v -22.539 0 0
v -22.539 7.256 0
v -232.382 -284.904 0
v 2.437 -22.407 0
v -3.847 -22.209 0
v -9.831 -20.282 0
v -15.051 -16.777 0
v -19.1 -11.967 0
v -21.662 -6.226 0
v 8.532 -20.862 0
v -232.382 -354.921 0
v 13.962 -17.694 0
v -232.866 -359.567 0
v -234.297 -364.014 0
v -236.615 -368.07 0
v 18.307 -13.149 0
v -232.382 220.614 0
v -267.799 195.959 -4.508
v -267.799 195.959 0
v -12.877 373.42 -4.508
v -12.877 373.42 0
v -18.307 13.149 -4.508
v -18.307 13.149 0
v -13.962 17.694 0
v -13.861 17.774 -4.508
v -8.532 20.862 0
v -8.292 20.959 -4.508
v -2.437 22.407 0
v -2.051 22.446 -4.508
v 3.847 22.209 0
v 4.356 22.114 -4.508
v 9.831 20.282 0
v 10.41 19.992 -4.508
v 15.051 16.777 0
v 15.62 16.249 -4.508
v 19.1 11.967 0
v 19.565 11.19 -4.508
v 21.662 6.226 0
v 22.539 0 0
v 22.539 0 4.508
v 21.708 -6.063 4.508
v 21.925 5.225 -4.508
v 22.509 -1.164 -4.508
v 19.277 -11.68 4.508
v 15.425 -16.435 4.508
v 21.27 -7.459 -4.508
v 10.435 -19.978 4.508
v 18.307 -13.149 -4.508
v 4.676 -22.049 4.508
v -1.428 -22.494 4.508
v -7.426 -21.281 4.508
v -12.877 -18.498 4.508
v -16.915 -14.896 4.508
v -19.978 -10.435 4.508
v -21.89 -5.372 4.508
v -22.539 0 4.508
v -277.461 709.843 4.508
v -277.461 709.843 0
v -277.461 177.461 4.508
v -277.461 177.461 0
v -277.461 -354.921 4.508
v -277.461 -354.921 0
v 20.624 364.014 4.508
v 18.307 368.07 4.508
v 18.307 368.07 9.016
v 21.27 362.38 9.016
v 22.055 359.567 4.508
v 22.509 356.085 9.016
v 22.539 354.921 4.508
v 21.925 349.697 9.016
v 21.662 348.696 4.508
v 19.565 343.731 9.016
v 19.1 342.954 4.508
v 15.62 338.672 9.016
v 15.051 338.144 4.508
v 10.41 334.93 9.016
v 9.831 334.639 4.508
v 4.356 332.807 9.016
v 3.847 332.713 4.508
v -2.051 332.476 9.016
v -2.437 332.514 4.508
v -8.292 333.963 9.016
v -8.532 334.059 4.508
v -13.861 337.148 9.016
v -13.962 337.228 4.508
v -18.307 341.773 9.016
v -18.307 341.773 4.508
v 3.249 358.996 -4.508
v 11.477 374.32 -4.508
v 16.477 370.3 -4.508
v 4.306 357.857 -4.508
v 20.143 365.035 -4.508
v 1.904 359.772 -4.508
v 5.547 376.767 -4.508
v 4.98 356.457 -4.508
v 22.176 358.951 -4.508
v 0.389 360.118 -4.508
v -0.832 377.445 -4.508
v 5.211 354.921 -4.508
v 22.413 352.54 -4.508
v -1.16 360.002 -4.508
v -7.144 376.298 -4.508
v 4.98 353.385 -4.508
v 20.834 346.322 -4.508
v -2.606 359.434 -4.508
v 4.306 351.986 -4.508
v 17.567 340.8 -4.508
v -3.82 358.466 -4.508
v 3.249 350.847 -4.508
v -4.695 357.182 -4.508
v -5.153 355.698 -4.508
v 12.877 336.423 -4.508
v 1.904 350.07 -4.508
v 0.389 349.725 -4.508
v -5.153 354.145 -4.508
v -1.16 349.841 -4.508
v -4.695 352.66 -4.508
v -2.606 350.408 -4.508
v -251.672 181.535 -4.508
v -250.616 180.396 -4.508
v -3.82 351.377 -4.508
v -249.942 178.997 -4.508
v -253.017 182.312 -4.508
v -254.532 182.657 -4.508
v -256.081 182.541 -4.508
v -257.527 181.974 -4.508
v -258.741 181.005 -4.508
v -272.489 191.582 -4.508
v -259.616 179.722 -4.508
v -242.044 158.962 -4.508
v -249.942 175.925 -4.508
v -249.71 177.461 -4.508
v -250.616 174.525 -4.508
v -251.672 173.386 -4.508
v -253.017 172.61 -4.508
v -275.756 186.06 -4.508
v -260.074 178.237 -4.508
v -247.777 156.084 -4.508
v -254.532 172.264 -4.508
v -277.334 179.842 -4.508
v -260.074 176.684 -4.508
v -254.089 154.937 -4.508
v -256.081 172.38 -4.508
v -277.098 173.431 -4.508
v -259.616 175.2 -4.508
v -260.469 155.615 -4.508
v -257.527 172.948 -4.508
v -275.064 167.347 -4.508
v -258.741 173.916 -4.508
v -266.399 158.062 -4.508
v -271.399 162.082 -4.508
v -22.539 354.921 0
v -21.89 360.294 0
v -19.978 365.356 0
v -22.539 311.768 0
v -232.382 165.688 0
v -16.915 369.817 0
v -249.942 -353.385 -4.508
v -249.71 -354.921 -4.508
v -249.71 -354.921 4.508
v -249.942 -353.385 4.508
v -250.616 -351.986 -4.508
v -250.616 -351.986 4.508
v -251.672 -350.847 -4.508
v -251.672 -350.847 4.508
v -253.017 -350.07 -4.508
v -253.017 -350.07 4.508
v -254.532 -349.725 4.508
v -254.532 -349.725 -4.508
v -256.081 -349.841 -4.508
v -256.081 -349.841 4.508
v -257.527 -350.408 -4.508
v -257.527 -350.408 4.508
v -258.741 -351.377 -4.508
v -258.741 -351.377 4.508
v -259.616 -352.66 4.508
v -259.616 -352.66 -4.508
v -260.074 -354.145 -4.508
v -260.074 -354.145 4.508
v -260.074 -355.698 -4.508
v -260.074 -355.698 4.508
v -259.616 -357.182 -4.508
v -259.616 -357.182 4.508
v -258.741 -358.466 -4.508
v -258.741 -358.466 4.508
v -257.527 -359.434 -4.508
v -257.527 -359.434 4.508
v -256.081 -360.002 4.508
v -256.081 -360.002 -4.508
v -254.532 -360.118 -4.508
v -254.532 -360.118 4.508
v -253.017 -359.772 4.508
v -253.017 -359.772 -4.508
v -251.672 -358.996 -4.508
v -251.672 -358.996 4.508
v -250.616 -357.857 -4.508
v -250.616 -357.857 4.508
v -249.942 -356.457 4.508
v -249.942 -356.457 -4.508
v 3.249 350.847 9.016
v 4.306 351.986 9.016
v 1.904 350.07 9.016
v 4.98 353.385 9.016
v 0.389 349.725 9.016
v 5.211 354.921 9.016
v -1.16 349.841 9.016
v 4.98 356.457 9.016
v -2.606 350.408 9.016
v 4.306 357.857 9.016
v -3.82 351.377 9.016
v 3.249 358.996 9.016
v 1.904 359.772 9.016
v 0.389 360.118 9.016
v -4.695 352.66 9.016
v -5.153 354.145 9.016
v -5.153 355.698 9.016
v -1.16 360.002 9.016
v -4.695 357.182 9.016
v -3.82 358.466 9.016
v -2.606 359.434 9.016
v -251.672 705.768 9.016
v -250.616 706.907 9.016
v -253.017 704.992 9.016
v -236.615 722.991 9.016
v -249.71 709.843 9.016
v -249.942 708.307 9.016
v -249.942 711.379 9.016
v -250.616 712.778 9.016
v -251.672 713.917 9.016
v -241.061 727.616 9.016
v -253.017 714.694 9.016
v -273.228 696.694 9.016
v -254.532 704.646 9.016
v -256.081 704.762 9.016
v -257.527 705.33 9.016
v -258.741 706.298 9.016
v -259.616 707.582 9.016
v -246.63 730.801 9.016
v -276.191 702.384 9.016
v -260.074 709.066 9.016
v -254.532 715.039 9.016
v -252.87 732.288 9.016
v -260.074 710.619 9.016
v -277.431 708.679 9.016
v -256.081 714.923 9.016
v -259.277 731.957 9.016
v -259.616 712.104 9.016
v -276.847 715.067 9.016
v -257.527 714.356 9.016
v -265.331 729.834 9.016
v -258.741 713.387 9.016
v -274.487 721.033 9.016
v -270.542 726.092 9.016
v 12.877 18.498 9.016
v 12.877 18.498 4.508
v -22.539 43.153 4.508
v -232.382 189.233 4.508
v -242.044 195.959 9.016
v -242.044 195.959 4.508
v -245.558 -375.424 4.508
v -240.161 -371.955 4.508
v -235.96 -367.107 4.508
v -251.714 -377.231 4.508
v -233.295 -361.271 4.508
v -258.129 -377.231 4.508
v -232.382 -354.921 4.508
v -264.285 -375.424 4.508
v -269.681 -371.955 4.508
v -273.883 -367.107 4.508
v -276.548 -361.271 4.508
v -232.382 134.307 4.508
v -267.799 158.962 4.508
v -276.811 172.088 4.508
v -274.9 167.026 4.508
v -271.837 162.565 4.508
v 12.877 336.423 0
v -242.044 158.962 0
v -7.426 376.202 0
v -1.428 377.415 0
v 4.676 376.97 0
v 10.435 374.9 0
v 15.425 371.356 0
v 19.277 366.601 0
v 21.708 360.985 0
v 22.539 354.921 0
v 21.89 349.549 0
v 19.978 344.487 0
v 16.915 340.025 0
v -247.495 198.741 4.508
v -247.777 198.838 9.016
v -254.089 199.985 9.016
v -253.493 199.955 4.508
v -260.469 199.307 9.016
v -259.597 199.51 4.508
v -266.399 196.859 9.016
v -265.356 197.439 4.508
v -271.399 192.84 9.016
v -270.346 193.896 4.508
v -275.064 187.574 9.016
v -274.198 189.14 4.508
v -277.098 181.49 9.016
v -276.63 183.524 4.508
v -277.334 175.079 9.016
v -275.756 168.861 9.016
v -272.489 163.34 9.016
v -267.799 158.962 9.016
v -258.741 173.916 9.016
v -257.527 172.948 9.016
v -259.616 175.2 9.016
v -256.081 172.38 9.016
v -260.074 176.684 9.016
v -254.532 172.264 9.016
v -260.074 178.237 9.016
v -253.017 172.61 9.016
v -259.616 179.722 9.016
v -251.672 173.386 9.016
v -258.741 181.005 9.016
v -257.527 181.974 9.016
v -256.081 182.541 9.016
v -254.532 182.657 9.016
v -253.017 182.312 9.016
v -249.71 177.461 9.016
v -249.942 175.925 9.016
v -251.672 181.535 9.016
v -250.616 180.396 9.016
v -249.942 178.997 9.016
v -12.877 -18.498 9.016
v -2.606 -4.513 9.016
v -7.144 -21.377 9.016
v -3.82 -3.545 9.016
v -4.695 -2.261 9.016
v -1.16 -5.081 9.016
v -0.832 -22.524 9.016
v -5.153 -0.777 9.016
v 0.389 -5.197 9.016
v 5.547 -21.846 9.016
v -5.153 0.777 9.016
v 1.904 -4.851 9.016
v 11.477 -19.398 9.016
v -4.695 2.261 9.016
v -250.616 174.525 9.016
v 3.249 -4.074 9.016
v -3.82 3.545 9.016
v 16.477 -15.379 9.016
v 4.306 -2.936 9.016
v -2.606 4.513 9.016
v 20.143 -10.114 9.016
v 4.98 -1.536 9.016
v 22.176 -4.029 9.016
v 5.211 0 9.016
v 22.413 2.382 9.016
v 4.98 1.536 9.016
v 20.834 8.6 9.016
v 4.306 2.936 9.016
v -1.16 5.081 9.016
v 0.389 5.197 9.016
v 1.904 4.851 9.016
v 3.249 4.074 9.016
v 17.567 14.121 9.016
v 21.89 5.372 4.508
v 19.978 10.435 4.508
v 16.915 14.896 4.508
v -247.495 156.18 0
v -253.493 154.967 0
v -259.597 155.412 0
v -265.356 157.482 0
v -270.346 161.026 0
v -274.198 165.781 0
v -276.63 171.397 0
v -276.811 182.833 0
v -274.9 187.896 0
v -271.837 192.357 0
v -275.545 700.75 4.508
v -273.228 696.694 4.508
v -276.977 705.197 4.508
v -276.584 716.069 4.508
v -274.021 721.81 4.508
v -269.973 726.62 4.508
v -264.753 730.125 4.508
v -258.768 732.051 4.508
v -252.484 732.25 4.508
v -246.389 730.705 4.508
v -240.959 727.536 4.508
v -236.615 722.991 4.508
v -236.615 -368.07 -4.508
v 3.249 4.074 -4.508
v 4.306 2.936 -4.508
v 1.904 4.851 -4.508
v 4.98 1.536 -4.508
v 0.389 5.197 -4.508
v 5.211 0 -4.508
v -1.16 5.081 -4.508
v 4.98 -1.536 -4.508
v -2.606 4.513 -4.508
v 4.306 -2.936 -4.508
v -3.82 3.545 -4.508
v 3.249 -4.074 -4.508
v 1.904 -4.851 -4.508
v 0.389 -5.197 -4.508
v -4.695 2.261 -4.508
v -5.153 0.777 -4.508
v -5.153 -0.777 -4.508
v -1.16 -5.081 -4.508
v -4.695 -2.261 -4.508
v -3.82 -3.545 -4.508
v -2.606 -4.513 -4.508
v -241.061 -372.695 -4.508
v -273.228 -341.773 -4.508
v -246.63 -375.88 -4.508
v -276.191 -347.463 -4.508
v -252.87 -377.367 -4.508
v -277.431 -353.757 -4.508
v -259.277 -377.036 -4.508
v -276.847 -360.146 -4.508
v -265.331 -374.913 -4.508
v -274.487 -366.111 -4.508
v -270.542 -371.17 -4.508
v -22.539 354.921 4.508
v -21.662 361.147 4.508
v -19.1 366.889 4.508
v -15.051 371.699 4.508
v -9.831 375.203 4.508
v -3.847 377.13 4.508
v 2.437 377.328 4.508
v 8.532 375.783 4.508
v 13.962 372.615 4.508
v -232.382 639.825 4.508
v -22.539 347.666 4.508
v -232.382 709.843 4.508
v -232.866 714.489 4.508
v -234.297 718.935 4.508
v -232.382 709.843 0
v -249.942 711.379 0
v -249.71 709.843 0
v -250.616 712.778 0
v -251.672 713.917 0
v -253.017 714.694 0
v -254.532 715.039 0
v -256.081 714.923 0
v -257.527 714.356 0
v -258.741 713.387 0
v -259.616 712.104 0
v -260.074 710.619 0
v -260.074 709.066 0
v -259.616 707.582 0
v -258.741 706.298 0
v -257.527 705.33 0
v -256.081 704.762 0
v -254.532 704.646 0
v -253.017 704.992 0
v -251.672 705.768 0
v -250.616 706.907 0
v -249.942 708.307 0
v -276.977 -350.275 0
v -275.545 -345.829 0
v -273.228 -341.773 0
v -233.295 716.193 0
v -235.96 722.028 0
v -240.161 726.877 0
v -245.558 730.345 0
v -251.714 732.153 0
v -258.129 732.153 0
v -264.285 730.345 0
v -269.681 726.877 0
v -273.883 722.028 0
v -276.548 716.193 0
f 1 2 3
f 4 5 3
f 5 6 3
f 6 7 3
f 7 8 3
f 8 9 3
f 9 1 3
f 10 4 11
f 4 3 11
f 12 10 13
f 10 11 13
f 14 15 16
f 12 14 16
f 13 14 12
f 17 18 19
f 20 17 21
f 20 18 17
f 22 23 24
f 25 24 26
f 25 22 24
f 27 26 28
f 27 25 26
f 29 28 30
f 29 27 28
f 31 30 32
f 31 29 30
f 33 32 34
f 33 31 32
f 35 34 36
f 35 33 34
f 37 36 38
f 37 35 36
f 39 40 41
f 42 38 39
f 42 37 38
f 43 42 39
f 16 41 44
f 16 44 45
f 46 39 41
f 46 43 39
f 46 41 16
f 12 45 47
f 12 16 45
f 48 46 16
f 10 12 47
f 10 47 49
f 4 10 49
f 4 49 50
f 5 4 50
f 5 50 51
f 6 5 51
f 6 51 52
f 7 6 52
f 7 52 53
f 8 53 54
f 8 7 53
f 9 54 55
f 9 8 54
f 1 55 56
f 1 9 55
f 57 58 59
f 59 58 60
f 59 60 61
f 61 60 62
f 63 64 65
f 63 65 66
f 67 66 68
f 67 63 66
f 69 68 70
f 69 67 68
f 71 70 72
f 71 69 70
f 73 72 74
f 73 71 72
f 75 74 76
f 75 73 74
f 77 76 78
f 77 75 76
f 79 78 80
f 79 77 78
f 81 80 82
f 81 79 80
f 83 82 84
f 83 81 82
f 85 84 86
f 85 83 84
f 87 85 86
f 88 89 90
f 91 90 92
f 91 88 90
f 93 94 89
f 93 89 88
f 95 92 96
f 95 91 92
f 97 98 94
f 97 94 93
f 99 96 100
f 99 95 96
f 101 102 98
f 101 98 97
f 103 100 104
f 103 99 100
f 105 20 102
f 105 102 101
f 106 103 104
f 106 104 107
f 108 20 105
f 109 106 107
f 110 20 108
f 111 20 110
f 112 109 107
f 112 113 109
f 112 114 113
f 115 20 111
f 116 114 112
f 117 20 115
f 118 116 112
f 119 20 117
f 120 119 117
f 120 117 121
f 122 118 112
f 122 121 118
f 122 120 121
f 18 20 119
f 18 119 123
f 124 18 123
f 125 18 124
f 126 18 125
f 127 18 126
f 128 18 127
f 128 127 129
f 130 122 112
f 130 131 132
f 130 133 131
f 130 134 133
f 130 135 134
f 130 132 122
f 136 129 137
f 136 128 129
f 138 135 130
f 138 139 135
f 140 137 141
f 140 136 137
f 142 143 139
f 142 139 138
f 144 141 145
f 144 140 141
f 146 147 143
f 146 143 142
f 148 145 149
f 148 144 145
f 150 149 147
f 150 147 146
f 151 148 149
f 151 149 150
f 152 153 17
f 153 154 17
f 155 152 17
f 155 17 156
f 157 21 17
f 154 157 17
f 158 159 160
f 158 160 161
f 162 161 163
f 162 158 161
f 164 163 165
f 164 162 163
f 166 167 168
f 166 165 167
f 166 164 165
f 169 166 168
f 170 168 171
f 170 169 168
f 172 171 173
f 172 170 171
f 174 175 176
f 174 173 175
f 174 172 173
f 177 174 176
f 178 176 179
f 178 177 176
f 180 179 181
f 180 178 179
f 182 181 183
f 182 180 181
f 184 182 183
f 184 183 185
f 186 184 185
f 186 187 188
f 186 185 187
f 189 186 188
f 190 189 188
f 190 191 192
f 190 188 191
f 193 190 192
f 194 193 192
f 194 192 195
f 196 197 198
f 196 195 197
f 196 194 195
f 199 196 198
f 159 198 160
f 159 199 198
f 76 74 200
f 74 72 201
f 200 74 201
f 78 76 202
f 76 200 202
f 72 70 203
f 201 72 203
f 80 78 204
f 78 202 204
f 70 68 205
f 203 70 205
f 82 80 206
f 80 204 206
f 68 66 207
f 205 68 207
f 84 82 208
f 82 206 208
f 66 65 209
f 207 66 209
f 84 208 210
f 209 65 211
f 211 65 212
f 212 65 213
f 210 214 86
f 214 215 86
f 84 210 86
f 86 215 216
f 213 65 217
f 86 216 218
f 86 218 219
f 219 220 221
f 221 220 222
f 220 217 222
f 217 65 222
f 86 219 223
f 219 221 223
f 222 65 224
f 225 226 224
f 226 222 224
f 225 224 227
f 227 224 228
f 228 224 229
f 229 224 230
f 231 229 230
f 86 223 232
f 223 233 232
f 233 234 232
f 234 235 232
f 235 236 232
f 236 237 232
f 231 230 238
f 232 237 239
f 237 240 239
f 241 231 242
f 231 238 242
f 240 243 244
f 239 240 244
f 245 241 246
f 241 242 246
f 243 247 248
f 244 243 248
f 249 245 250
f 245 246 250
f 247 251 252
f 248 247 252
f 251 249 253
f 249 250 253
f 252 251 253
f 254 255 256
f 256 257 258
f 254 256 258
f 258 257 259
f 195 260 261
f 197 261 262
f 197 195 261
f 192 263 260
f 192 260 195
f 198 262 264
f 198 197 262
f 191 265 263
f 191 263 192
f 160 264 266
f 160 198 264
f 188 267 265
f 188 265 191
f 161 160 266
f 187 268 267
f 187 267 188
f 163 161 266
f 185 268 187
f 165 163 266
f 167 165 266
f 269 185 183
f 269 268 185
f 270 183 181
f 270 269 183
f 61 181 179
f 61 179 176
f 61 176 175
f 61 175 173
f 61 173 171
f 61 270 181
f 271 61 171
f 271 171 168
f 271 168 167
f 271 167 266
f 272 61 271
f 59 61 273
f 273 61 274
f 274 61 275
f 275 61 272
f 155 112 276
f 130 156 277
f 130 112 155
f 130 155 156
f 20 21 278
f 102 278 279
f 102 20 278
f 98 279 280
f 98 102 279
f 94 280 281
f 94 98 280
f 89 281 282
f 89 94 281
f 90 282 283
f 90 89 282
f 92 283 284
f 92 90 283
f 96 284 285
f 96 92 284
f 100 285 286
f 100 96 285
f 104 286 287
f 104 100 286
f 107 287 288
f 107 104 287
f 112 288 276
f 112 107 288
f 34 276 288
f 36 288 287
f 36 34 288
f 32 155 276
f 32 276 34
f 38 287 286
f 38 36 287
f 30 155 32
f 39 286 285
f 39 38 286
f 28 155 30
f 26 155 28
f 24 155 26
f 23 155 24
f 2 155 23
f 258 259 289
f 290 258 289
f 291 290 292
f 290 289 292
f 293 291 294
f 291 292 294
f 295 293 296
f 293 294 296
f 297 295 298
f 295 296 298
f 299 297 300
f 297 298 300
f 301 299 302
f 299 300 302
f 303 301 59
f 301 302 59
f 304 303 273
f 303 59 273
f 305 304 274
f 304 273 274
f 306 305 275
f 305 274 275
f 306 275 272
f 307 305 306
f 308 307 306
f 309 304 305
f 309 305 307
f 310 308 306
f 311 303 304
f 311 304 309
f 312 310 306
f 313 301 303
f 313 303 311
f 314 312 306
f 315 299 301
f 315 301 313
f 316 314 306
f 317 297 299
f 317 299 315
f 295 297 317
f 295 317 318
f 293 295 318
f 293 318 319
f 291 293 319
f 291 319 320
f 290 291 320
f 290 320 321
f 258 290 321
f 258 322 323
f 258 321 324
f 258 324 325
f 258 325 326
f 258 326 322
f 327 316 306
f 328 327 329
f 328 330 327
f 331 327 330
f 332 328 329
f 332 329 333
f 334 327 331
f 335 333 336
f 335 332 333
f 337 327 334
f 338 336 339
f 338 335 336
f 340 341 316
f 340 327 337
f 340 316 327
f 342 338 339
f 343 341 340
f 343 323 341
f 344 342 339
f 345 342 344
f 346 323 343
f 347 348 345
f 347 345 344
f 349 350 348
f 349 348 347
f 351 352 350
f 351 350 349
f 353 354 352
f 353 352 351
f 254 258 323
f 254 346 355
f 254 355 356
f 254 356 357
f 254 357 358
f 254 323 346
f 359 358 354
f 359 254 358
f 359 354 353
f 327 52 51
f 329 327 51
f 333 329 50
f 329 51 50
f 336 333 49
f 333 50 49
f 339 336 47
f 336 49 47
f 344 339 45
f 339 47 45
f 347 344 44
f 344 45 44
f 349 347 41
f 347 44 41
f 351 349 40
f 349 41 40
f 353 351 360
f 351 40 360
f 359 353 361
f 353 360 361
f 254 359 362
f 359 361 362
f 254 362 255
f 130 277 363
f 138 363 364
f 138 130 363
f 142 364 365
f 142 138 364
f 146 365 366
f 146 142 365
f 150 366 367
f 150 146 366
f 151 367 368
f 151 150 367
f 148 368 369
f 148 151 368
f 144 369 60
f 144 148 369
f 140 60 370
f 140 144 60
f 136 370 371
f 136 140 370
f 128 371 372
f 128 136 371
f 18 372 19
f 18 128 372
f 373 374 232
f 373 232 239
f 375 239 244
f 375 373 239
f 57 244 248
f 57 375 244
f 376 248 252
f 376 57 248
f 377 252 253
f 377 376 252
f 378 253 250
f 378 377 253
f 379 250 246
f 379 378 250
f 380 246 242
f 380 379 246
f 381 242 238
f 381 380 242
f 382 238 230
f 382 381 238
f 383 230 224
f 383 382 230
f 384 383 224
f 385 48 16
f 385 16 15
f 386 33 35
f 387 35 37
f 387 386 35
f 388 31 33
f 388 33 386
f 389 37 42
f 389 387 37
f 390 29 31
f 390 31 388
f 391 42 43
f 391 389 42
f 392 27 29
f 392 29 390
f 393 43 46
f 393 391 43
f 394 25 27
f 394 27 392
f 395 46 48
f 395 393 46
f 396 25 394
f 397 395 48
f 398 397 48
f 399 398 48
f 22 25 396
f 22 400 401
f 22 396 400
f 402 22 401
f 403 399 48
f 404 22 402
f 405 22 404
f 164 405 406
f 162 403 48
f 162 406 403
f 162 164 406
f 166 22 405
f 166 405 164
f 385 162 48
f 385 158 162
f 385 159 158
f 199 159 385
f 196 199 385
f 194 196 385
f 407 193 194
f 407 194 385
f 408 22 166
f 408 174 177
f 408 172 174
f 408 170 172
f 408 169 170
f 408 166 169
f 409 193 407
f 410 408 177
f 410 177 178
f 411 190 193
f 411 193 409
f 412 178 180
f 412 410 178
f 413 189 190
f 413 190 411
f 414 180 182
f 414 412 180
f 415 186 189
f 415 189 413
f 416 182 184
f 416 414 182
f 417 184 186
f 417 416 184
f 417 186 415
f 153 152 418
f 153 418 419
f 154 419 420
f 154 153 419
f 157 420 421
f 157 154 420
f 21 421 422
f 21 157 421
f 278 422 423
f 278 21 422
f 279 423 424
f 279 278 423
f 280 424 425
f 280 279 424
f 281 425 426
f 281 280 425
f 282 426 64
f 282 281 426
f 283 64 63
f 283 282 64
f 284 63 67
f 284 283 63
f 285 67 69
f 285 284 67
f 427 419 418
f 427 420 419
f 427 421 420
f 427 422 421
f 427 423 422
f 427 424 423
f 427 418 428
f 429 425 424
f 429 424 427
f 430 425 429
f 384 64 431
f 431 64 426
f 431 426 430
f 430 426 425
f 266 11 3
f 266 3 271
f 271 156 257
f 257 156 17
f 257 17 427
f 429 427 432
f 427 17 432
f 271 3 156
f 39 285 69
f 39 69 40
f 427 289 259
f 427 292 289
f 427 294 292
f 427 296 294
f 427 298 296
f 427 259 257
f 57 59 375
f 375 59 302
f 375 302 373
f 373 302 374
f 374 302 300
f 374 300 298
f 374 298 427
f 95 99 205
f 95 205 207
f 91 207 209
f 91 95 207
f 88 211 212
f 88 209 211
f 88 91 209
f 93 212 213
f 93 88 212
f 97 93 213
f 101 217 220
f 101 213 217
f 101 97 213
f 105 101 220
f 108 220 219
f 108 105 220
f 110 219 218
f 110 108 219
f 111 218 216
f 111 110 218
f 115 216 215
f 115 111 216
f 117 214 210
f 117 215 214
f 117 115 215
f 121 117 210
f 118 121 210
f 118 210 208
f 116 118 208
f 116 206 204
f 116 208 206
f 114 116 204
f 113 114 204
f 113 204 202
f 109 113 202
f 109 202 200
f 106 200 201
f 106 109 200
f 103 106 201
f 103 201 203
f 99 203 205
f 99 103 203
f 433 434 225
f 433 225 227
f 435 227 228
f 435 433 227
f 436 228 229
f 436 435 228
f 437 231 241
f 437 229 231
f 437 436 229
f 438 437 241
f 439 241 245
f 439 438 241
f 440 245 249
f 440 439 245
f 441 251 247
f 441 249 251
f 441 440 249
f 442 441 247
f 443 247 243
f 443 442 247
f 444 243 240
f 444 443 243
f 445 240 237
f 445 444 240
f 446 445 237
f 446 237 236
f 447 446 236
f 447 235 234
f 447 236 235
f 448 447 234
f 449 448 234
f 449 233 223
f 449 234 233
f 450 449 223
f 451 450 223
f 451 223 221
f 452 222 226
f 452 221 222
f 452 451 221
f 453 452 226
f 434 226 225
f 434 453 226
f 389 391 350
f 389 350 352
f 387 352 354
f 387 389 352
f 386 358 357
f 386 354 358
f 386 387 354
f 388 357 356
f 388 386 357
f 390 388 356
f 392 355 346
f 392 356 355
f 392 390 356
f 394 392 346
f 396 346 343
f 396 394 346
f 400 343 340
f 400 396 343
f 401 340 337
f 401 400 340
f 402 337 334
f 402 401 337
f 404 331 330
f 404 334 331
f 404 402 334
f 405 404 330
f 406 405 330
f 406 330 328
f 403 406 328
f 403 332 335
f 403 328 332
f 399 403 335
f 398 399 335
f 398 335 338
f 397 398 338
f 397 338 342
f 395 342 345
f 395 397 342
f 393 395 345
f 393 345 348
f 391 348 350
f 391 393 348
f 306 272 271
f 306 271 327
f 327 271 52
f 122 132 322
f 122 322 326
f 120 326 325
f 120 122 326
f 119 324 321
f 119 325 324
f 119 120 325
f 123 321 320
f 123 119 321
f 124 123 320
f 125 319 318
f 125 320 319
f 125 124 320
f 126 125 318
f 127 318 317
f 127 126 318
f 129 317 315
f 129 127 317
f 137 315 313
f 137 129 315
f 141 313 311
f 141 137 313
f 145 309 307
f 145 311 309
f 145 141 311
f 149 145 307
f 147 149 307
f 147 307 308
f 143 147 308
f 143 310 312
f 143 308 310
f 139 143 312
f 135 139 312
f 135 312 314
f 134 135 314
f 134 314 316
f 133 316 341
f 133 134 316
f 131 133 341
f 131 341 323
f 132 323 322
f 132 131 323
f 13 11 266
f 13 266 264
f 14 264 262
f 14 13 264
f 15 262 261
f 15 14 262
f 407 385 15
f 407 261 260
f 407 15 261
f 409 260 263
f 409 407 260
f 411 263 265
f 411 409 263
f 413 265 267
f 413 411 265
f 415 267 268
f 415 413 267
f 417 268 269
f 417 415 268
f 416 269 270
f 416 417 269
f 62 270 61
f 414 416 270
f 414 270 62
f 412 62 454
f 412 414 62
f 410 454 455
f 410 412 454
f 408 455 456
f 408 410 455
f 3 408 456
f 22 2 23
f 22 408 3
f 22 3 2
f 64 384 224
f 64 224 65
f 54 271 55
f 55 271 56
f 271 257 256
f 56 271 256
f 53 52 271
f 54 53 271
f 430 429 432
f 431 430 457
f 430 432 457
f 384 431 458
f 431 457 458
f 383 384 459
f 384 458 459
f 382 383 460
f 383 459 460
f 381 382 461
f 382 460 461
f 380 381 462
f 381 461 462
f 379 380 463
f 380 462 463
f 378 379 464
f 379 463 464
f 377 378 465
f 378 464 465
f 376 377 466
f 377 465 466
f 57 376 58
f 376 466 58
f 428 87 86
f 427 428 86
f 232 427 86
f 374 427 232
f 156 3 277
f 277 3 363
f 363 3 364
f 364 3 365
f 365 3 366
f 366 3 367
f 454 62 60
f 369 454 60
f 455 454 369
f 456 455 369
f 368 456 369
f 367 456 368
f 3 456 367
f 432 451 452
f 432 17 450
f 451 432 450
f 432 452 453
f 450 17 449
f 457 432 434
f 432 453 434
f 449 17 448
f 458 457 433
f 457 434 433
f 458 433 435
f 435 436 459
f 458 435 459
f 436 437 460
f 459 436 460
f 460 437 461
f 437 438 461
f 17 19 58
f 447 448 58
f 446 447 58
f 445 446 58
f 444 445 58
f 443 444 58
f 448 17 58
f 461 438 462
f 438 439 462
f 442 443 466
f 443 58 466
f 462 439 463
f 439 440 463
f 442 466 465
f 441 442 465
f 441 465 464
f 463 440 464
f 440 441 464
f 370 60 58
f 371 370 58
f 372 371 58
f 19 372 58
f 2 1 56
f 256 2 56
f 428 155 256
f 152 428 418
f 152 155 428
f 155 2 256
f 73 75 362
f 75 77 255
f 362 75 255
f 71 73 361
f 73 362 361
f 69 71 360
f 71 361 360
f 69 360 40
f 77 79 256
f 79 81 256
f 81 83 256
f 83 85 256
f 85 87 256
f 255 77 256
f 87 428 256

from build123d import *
from build123d.topology import SkipClean

# Parameters (mm, degrees)
CD_DEPTH                = 4.50787
BE_AE_DEPTH             = 4.50787
BOSS_EXTRUDE3_START     = -4.50787
BOSS_EXTRUDE3_DEPTH     = 4.50787
BOSS_EXTRUDE4_DEPTH     = 4.50787
BOSS_EXTRUDE5_START     = -4.50787
BOSS_EXTRUDE5_DEPTH     = 4.50787
BOSS_EXTRUDE7_DEPTH     = 4.50787
CUT_EXTRUDE1_DEPTH      = 784.294801
CUT_EXTRUDE1_DEPTH_BACK = 784.294801
SKETCH5_R               = 5.211191


with BuildPart() as part:
    # Sketch1 → CD (new body)
    with BuildSketch(Plane(origin=(0, 0, 0), x_dir=(0, 1, 0), z_dir=(0, 0, 1))):
        with BuildLine():
            Line((0, 22.539325), (354.92135, 22.539325))
            ThreePointArc((354.92135, 22.539325), (377.460675, 0), (354.92135, -22.539325))
            Line((354.92135, -22.539325), (0, -22.539325))
            ThreePointArc((0, -22.539325), (-22.539325, 0), (0, 22.539325))
        make_face()
    extrude(amount=CD_DEPTH)



with BuildPart() as body_2:
    # Sketch1<4> → BE & AE (new body)
    with BuildSketch(Plane(origin=(0, 0, 0), x_dir=(0, 1, 0), z_dir=(0, 0, 1))):
        with BuildLine():
            Line((177.460675, 277.460675), (-354.92135, 277.460675))
            ThreePointArc((-354.92135, 277.460675), (-377.460675, 254.92135), (-354.92135, 232.382025))
            Line((-354.92135, 232.382025), (177.460675, 232.382025))
            ThreePointArc((177.460675, 232.382025), (154.92135, 254.92135), (177.460675, 277.460675))
        make_face()
        with BuildLine():
            Line((709.8427, 277.460675), (177.460675, 277.460675))
            ThreePointArc((177.460675, 277.460675), (200, 254.92135), (177.460675, 232.382025))
            Line((177.460675, 232.382025), (709.8427, 232.382025))
            ThreePointArc((709.8427, 232.382025), (732.382025, 254.92135), (709.8427, 277.460675))
        make_face()
        with BuildLine():
            ThreePointArc((177.460675, 232.382025), (200, 254.92135), (177.460675, 277.460675))
            ThreePointArc((177.460675, 277.460675), (154.92135, 254.92135), (177.460675, 232.382025))
        make_face()
    extrude(amount=BE_AE_DEPTH)


with BuildPart() as part_1:
    add(part.part)

    add(body_2.part)  # Boss-Extrude3 merges body 2
    # Sketch1<5> → Boss-Extrude3 (add)
    with BuildSketch(Plane(origin=(0, 0, 0), x_dir=(0, 1, 0), z_dir=(0, 0, 1)).offset(BOSS_EXTRUDE3_START)):
        with BuildLine():
            Line((-341.772655, 273.227988), (13.148695, 18.306638))
            ThreePointArc((13.148695, 18.306638), (18.306638, -13.148695), (-13.148695, -18.306638))
            Line((-13.148695, -18.306638), (-368.070045, 236.614712))
            ThreePointArc((-368.070045, 236.614712), (-373.227988, 268.070045), (-341.772655, 273.227988))
        make_face()
    extrude(amount=BOSS_EXTRUDE3_DEPTH)

    # Sketch3 → Boss-Extrude4 (add)
    with BuildSketch(Plane.XY.offset(4.50787)):
        with BuildLine():
            Line((12.877475, 18.498427), (-242.043875, 195.959102))
            ThreePointArc((-242.043875, 195.959102), (-273.419777, 190.33815), (-267.798825, 158.962248))
            Line((-267.798825, 158.962248), (-12.877475, -18.498427))
            ThreePointArc((-12.877475, -18.498427), (18.498427, -12.877475), (12.877475, 18.498427))
        make_face()
    extrude(amount=BOSS_EXTRUDE4_DEPTH)

    # Sketch1<6> → Boss-Extrude5 (add)
    with BuildSketch(Plane(origin=(0, 0, 0), x_dir=(0, 1, 0), z_dir=(0, 0, 1)).offset(BOSS_EXTRUDE5_START)):
        with BuildLine():
            Line((195.959102, 267.798825), (373.419777, 12.877475))
            ThreePointArc((373.419777, 12.877475), (367.798825, -18.498427), (336.422923, -12.877475))
            Line((336.422923, -12.877475), (158.962248, 242.043875))
            ThreePointArc((158.962248, 242.043875), (164.5832, 273.419777), (195.959102, 267.798825))
        make_face()
    extrude(amount=BOSS_EXTRUDE5_DEPTH)

    # Sketch4 → Boss-Extrude7 (add)
    with SkipClean():  # the faces are left unmerged after this step: merging them gives an invalid solid
        with BuildSketch(Plane.XY.offset(4.50787)):
            with BuildLine():
                Line((-236.614712, 722.991395), (18.306638, 368.070045))
                ThreePointArc((18.306638, 368.070045), (13.148695, 336.614712), (-18.306638, 341.772655))
                Line((-18.306638, 341.772655), (-273.227988, 696.694005))
                ThreePointArc((-273.227988, 696.694005), (-268.070045, 728.149338), (-236.614712, 722.991395))
            make_face()
        extrude(amount=BOSS_EXTRUDE7_DEPTH)

    # Sketch5 → Cut-Extrude1 (cut, two sides: drawn at the far end of the back side and taken through both)
    with SkipClean():  # the faces are left unmerged after this step: merging them gives an invalid solid
        with BuildSketch(Plane.XY.offset(9.01574).offset(-CUT_EXTRUDE1_DEPTH_BACK)):
            Circle(SKETCH5_R)
            with Locations((-254.92135, 177.460675)):
                Circle(SKETCH5_R)
            with Locations((-254.92135, -354.92135)):
                Circle(SKETCH5_R)
            with Locations((0, 354.92135)):
                Circle(SKETCH5_R)
            with Locations((-254.92135, 709.8427)):
                Circle(SKETCH5_R)
        extrude(amount=CUT_EXTRUDE1_DEPTH + CUT_EXTRUDE1_DEPTH_BACK, mode=Mode.SUBTRACT)


solid = part_1.part
